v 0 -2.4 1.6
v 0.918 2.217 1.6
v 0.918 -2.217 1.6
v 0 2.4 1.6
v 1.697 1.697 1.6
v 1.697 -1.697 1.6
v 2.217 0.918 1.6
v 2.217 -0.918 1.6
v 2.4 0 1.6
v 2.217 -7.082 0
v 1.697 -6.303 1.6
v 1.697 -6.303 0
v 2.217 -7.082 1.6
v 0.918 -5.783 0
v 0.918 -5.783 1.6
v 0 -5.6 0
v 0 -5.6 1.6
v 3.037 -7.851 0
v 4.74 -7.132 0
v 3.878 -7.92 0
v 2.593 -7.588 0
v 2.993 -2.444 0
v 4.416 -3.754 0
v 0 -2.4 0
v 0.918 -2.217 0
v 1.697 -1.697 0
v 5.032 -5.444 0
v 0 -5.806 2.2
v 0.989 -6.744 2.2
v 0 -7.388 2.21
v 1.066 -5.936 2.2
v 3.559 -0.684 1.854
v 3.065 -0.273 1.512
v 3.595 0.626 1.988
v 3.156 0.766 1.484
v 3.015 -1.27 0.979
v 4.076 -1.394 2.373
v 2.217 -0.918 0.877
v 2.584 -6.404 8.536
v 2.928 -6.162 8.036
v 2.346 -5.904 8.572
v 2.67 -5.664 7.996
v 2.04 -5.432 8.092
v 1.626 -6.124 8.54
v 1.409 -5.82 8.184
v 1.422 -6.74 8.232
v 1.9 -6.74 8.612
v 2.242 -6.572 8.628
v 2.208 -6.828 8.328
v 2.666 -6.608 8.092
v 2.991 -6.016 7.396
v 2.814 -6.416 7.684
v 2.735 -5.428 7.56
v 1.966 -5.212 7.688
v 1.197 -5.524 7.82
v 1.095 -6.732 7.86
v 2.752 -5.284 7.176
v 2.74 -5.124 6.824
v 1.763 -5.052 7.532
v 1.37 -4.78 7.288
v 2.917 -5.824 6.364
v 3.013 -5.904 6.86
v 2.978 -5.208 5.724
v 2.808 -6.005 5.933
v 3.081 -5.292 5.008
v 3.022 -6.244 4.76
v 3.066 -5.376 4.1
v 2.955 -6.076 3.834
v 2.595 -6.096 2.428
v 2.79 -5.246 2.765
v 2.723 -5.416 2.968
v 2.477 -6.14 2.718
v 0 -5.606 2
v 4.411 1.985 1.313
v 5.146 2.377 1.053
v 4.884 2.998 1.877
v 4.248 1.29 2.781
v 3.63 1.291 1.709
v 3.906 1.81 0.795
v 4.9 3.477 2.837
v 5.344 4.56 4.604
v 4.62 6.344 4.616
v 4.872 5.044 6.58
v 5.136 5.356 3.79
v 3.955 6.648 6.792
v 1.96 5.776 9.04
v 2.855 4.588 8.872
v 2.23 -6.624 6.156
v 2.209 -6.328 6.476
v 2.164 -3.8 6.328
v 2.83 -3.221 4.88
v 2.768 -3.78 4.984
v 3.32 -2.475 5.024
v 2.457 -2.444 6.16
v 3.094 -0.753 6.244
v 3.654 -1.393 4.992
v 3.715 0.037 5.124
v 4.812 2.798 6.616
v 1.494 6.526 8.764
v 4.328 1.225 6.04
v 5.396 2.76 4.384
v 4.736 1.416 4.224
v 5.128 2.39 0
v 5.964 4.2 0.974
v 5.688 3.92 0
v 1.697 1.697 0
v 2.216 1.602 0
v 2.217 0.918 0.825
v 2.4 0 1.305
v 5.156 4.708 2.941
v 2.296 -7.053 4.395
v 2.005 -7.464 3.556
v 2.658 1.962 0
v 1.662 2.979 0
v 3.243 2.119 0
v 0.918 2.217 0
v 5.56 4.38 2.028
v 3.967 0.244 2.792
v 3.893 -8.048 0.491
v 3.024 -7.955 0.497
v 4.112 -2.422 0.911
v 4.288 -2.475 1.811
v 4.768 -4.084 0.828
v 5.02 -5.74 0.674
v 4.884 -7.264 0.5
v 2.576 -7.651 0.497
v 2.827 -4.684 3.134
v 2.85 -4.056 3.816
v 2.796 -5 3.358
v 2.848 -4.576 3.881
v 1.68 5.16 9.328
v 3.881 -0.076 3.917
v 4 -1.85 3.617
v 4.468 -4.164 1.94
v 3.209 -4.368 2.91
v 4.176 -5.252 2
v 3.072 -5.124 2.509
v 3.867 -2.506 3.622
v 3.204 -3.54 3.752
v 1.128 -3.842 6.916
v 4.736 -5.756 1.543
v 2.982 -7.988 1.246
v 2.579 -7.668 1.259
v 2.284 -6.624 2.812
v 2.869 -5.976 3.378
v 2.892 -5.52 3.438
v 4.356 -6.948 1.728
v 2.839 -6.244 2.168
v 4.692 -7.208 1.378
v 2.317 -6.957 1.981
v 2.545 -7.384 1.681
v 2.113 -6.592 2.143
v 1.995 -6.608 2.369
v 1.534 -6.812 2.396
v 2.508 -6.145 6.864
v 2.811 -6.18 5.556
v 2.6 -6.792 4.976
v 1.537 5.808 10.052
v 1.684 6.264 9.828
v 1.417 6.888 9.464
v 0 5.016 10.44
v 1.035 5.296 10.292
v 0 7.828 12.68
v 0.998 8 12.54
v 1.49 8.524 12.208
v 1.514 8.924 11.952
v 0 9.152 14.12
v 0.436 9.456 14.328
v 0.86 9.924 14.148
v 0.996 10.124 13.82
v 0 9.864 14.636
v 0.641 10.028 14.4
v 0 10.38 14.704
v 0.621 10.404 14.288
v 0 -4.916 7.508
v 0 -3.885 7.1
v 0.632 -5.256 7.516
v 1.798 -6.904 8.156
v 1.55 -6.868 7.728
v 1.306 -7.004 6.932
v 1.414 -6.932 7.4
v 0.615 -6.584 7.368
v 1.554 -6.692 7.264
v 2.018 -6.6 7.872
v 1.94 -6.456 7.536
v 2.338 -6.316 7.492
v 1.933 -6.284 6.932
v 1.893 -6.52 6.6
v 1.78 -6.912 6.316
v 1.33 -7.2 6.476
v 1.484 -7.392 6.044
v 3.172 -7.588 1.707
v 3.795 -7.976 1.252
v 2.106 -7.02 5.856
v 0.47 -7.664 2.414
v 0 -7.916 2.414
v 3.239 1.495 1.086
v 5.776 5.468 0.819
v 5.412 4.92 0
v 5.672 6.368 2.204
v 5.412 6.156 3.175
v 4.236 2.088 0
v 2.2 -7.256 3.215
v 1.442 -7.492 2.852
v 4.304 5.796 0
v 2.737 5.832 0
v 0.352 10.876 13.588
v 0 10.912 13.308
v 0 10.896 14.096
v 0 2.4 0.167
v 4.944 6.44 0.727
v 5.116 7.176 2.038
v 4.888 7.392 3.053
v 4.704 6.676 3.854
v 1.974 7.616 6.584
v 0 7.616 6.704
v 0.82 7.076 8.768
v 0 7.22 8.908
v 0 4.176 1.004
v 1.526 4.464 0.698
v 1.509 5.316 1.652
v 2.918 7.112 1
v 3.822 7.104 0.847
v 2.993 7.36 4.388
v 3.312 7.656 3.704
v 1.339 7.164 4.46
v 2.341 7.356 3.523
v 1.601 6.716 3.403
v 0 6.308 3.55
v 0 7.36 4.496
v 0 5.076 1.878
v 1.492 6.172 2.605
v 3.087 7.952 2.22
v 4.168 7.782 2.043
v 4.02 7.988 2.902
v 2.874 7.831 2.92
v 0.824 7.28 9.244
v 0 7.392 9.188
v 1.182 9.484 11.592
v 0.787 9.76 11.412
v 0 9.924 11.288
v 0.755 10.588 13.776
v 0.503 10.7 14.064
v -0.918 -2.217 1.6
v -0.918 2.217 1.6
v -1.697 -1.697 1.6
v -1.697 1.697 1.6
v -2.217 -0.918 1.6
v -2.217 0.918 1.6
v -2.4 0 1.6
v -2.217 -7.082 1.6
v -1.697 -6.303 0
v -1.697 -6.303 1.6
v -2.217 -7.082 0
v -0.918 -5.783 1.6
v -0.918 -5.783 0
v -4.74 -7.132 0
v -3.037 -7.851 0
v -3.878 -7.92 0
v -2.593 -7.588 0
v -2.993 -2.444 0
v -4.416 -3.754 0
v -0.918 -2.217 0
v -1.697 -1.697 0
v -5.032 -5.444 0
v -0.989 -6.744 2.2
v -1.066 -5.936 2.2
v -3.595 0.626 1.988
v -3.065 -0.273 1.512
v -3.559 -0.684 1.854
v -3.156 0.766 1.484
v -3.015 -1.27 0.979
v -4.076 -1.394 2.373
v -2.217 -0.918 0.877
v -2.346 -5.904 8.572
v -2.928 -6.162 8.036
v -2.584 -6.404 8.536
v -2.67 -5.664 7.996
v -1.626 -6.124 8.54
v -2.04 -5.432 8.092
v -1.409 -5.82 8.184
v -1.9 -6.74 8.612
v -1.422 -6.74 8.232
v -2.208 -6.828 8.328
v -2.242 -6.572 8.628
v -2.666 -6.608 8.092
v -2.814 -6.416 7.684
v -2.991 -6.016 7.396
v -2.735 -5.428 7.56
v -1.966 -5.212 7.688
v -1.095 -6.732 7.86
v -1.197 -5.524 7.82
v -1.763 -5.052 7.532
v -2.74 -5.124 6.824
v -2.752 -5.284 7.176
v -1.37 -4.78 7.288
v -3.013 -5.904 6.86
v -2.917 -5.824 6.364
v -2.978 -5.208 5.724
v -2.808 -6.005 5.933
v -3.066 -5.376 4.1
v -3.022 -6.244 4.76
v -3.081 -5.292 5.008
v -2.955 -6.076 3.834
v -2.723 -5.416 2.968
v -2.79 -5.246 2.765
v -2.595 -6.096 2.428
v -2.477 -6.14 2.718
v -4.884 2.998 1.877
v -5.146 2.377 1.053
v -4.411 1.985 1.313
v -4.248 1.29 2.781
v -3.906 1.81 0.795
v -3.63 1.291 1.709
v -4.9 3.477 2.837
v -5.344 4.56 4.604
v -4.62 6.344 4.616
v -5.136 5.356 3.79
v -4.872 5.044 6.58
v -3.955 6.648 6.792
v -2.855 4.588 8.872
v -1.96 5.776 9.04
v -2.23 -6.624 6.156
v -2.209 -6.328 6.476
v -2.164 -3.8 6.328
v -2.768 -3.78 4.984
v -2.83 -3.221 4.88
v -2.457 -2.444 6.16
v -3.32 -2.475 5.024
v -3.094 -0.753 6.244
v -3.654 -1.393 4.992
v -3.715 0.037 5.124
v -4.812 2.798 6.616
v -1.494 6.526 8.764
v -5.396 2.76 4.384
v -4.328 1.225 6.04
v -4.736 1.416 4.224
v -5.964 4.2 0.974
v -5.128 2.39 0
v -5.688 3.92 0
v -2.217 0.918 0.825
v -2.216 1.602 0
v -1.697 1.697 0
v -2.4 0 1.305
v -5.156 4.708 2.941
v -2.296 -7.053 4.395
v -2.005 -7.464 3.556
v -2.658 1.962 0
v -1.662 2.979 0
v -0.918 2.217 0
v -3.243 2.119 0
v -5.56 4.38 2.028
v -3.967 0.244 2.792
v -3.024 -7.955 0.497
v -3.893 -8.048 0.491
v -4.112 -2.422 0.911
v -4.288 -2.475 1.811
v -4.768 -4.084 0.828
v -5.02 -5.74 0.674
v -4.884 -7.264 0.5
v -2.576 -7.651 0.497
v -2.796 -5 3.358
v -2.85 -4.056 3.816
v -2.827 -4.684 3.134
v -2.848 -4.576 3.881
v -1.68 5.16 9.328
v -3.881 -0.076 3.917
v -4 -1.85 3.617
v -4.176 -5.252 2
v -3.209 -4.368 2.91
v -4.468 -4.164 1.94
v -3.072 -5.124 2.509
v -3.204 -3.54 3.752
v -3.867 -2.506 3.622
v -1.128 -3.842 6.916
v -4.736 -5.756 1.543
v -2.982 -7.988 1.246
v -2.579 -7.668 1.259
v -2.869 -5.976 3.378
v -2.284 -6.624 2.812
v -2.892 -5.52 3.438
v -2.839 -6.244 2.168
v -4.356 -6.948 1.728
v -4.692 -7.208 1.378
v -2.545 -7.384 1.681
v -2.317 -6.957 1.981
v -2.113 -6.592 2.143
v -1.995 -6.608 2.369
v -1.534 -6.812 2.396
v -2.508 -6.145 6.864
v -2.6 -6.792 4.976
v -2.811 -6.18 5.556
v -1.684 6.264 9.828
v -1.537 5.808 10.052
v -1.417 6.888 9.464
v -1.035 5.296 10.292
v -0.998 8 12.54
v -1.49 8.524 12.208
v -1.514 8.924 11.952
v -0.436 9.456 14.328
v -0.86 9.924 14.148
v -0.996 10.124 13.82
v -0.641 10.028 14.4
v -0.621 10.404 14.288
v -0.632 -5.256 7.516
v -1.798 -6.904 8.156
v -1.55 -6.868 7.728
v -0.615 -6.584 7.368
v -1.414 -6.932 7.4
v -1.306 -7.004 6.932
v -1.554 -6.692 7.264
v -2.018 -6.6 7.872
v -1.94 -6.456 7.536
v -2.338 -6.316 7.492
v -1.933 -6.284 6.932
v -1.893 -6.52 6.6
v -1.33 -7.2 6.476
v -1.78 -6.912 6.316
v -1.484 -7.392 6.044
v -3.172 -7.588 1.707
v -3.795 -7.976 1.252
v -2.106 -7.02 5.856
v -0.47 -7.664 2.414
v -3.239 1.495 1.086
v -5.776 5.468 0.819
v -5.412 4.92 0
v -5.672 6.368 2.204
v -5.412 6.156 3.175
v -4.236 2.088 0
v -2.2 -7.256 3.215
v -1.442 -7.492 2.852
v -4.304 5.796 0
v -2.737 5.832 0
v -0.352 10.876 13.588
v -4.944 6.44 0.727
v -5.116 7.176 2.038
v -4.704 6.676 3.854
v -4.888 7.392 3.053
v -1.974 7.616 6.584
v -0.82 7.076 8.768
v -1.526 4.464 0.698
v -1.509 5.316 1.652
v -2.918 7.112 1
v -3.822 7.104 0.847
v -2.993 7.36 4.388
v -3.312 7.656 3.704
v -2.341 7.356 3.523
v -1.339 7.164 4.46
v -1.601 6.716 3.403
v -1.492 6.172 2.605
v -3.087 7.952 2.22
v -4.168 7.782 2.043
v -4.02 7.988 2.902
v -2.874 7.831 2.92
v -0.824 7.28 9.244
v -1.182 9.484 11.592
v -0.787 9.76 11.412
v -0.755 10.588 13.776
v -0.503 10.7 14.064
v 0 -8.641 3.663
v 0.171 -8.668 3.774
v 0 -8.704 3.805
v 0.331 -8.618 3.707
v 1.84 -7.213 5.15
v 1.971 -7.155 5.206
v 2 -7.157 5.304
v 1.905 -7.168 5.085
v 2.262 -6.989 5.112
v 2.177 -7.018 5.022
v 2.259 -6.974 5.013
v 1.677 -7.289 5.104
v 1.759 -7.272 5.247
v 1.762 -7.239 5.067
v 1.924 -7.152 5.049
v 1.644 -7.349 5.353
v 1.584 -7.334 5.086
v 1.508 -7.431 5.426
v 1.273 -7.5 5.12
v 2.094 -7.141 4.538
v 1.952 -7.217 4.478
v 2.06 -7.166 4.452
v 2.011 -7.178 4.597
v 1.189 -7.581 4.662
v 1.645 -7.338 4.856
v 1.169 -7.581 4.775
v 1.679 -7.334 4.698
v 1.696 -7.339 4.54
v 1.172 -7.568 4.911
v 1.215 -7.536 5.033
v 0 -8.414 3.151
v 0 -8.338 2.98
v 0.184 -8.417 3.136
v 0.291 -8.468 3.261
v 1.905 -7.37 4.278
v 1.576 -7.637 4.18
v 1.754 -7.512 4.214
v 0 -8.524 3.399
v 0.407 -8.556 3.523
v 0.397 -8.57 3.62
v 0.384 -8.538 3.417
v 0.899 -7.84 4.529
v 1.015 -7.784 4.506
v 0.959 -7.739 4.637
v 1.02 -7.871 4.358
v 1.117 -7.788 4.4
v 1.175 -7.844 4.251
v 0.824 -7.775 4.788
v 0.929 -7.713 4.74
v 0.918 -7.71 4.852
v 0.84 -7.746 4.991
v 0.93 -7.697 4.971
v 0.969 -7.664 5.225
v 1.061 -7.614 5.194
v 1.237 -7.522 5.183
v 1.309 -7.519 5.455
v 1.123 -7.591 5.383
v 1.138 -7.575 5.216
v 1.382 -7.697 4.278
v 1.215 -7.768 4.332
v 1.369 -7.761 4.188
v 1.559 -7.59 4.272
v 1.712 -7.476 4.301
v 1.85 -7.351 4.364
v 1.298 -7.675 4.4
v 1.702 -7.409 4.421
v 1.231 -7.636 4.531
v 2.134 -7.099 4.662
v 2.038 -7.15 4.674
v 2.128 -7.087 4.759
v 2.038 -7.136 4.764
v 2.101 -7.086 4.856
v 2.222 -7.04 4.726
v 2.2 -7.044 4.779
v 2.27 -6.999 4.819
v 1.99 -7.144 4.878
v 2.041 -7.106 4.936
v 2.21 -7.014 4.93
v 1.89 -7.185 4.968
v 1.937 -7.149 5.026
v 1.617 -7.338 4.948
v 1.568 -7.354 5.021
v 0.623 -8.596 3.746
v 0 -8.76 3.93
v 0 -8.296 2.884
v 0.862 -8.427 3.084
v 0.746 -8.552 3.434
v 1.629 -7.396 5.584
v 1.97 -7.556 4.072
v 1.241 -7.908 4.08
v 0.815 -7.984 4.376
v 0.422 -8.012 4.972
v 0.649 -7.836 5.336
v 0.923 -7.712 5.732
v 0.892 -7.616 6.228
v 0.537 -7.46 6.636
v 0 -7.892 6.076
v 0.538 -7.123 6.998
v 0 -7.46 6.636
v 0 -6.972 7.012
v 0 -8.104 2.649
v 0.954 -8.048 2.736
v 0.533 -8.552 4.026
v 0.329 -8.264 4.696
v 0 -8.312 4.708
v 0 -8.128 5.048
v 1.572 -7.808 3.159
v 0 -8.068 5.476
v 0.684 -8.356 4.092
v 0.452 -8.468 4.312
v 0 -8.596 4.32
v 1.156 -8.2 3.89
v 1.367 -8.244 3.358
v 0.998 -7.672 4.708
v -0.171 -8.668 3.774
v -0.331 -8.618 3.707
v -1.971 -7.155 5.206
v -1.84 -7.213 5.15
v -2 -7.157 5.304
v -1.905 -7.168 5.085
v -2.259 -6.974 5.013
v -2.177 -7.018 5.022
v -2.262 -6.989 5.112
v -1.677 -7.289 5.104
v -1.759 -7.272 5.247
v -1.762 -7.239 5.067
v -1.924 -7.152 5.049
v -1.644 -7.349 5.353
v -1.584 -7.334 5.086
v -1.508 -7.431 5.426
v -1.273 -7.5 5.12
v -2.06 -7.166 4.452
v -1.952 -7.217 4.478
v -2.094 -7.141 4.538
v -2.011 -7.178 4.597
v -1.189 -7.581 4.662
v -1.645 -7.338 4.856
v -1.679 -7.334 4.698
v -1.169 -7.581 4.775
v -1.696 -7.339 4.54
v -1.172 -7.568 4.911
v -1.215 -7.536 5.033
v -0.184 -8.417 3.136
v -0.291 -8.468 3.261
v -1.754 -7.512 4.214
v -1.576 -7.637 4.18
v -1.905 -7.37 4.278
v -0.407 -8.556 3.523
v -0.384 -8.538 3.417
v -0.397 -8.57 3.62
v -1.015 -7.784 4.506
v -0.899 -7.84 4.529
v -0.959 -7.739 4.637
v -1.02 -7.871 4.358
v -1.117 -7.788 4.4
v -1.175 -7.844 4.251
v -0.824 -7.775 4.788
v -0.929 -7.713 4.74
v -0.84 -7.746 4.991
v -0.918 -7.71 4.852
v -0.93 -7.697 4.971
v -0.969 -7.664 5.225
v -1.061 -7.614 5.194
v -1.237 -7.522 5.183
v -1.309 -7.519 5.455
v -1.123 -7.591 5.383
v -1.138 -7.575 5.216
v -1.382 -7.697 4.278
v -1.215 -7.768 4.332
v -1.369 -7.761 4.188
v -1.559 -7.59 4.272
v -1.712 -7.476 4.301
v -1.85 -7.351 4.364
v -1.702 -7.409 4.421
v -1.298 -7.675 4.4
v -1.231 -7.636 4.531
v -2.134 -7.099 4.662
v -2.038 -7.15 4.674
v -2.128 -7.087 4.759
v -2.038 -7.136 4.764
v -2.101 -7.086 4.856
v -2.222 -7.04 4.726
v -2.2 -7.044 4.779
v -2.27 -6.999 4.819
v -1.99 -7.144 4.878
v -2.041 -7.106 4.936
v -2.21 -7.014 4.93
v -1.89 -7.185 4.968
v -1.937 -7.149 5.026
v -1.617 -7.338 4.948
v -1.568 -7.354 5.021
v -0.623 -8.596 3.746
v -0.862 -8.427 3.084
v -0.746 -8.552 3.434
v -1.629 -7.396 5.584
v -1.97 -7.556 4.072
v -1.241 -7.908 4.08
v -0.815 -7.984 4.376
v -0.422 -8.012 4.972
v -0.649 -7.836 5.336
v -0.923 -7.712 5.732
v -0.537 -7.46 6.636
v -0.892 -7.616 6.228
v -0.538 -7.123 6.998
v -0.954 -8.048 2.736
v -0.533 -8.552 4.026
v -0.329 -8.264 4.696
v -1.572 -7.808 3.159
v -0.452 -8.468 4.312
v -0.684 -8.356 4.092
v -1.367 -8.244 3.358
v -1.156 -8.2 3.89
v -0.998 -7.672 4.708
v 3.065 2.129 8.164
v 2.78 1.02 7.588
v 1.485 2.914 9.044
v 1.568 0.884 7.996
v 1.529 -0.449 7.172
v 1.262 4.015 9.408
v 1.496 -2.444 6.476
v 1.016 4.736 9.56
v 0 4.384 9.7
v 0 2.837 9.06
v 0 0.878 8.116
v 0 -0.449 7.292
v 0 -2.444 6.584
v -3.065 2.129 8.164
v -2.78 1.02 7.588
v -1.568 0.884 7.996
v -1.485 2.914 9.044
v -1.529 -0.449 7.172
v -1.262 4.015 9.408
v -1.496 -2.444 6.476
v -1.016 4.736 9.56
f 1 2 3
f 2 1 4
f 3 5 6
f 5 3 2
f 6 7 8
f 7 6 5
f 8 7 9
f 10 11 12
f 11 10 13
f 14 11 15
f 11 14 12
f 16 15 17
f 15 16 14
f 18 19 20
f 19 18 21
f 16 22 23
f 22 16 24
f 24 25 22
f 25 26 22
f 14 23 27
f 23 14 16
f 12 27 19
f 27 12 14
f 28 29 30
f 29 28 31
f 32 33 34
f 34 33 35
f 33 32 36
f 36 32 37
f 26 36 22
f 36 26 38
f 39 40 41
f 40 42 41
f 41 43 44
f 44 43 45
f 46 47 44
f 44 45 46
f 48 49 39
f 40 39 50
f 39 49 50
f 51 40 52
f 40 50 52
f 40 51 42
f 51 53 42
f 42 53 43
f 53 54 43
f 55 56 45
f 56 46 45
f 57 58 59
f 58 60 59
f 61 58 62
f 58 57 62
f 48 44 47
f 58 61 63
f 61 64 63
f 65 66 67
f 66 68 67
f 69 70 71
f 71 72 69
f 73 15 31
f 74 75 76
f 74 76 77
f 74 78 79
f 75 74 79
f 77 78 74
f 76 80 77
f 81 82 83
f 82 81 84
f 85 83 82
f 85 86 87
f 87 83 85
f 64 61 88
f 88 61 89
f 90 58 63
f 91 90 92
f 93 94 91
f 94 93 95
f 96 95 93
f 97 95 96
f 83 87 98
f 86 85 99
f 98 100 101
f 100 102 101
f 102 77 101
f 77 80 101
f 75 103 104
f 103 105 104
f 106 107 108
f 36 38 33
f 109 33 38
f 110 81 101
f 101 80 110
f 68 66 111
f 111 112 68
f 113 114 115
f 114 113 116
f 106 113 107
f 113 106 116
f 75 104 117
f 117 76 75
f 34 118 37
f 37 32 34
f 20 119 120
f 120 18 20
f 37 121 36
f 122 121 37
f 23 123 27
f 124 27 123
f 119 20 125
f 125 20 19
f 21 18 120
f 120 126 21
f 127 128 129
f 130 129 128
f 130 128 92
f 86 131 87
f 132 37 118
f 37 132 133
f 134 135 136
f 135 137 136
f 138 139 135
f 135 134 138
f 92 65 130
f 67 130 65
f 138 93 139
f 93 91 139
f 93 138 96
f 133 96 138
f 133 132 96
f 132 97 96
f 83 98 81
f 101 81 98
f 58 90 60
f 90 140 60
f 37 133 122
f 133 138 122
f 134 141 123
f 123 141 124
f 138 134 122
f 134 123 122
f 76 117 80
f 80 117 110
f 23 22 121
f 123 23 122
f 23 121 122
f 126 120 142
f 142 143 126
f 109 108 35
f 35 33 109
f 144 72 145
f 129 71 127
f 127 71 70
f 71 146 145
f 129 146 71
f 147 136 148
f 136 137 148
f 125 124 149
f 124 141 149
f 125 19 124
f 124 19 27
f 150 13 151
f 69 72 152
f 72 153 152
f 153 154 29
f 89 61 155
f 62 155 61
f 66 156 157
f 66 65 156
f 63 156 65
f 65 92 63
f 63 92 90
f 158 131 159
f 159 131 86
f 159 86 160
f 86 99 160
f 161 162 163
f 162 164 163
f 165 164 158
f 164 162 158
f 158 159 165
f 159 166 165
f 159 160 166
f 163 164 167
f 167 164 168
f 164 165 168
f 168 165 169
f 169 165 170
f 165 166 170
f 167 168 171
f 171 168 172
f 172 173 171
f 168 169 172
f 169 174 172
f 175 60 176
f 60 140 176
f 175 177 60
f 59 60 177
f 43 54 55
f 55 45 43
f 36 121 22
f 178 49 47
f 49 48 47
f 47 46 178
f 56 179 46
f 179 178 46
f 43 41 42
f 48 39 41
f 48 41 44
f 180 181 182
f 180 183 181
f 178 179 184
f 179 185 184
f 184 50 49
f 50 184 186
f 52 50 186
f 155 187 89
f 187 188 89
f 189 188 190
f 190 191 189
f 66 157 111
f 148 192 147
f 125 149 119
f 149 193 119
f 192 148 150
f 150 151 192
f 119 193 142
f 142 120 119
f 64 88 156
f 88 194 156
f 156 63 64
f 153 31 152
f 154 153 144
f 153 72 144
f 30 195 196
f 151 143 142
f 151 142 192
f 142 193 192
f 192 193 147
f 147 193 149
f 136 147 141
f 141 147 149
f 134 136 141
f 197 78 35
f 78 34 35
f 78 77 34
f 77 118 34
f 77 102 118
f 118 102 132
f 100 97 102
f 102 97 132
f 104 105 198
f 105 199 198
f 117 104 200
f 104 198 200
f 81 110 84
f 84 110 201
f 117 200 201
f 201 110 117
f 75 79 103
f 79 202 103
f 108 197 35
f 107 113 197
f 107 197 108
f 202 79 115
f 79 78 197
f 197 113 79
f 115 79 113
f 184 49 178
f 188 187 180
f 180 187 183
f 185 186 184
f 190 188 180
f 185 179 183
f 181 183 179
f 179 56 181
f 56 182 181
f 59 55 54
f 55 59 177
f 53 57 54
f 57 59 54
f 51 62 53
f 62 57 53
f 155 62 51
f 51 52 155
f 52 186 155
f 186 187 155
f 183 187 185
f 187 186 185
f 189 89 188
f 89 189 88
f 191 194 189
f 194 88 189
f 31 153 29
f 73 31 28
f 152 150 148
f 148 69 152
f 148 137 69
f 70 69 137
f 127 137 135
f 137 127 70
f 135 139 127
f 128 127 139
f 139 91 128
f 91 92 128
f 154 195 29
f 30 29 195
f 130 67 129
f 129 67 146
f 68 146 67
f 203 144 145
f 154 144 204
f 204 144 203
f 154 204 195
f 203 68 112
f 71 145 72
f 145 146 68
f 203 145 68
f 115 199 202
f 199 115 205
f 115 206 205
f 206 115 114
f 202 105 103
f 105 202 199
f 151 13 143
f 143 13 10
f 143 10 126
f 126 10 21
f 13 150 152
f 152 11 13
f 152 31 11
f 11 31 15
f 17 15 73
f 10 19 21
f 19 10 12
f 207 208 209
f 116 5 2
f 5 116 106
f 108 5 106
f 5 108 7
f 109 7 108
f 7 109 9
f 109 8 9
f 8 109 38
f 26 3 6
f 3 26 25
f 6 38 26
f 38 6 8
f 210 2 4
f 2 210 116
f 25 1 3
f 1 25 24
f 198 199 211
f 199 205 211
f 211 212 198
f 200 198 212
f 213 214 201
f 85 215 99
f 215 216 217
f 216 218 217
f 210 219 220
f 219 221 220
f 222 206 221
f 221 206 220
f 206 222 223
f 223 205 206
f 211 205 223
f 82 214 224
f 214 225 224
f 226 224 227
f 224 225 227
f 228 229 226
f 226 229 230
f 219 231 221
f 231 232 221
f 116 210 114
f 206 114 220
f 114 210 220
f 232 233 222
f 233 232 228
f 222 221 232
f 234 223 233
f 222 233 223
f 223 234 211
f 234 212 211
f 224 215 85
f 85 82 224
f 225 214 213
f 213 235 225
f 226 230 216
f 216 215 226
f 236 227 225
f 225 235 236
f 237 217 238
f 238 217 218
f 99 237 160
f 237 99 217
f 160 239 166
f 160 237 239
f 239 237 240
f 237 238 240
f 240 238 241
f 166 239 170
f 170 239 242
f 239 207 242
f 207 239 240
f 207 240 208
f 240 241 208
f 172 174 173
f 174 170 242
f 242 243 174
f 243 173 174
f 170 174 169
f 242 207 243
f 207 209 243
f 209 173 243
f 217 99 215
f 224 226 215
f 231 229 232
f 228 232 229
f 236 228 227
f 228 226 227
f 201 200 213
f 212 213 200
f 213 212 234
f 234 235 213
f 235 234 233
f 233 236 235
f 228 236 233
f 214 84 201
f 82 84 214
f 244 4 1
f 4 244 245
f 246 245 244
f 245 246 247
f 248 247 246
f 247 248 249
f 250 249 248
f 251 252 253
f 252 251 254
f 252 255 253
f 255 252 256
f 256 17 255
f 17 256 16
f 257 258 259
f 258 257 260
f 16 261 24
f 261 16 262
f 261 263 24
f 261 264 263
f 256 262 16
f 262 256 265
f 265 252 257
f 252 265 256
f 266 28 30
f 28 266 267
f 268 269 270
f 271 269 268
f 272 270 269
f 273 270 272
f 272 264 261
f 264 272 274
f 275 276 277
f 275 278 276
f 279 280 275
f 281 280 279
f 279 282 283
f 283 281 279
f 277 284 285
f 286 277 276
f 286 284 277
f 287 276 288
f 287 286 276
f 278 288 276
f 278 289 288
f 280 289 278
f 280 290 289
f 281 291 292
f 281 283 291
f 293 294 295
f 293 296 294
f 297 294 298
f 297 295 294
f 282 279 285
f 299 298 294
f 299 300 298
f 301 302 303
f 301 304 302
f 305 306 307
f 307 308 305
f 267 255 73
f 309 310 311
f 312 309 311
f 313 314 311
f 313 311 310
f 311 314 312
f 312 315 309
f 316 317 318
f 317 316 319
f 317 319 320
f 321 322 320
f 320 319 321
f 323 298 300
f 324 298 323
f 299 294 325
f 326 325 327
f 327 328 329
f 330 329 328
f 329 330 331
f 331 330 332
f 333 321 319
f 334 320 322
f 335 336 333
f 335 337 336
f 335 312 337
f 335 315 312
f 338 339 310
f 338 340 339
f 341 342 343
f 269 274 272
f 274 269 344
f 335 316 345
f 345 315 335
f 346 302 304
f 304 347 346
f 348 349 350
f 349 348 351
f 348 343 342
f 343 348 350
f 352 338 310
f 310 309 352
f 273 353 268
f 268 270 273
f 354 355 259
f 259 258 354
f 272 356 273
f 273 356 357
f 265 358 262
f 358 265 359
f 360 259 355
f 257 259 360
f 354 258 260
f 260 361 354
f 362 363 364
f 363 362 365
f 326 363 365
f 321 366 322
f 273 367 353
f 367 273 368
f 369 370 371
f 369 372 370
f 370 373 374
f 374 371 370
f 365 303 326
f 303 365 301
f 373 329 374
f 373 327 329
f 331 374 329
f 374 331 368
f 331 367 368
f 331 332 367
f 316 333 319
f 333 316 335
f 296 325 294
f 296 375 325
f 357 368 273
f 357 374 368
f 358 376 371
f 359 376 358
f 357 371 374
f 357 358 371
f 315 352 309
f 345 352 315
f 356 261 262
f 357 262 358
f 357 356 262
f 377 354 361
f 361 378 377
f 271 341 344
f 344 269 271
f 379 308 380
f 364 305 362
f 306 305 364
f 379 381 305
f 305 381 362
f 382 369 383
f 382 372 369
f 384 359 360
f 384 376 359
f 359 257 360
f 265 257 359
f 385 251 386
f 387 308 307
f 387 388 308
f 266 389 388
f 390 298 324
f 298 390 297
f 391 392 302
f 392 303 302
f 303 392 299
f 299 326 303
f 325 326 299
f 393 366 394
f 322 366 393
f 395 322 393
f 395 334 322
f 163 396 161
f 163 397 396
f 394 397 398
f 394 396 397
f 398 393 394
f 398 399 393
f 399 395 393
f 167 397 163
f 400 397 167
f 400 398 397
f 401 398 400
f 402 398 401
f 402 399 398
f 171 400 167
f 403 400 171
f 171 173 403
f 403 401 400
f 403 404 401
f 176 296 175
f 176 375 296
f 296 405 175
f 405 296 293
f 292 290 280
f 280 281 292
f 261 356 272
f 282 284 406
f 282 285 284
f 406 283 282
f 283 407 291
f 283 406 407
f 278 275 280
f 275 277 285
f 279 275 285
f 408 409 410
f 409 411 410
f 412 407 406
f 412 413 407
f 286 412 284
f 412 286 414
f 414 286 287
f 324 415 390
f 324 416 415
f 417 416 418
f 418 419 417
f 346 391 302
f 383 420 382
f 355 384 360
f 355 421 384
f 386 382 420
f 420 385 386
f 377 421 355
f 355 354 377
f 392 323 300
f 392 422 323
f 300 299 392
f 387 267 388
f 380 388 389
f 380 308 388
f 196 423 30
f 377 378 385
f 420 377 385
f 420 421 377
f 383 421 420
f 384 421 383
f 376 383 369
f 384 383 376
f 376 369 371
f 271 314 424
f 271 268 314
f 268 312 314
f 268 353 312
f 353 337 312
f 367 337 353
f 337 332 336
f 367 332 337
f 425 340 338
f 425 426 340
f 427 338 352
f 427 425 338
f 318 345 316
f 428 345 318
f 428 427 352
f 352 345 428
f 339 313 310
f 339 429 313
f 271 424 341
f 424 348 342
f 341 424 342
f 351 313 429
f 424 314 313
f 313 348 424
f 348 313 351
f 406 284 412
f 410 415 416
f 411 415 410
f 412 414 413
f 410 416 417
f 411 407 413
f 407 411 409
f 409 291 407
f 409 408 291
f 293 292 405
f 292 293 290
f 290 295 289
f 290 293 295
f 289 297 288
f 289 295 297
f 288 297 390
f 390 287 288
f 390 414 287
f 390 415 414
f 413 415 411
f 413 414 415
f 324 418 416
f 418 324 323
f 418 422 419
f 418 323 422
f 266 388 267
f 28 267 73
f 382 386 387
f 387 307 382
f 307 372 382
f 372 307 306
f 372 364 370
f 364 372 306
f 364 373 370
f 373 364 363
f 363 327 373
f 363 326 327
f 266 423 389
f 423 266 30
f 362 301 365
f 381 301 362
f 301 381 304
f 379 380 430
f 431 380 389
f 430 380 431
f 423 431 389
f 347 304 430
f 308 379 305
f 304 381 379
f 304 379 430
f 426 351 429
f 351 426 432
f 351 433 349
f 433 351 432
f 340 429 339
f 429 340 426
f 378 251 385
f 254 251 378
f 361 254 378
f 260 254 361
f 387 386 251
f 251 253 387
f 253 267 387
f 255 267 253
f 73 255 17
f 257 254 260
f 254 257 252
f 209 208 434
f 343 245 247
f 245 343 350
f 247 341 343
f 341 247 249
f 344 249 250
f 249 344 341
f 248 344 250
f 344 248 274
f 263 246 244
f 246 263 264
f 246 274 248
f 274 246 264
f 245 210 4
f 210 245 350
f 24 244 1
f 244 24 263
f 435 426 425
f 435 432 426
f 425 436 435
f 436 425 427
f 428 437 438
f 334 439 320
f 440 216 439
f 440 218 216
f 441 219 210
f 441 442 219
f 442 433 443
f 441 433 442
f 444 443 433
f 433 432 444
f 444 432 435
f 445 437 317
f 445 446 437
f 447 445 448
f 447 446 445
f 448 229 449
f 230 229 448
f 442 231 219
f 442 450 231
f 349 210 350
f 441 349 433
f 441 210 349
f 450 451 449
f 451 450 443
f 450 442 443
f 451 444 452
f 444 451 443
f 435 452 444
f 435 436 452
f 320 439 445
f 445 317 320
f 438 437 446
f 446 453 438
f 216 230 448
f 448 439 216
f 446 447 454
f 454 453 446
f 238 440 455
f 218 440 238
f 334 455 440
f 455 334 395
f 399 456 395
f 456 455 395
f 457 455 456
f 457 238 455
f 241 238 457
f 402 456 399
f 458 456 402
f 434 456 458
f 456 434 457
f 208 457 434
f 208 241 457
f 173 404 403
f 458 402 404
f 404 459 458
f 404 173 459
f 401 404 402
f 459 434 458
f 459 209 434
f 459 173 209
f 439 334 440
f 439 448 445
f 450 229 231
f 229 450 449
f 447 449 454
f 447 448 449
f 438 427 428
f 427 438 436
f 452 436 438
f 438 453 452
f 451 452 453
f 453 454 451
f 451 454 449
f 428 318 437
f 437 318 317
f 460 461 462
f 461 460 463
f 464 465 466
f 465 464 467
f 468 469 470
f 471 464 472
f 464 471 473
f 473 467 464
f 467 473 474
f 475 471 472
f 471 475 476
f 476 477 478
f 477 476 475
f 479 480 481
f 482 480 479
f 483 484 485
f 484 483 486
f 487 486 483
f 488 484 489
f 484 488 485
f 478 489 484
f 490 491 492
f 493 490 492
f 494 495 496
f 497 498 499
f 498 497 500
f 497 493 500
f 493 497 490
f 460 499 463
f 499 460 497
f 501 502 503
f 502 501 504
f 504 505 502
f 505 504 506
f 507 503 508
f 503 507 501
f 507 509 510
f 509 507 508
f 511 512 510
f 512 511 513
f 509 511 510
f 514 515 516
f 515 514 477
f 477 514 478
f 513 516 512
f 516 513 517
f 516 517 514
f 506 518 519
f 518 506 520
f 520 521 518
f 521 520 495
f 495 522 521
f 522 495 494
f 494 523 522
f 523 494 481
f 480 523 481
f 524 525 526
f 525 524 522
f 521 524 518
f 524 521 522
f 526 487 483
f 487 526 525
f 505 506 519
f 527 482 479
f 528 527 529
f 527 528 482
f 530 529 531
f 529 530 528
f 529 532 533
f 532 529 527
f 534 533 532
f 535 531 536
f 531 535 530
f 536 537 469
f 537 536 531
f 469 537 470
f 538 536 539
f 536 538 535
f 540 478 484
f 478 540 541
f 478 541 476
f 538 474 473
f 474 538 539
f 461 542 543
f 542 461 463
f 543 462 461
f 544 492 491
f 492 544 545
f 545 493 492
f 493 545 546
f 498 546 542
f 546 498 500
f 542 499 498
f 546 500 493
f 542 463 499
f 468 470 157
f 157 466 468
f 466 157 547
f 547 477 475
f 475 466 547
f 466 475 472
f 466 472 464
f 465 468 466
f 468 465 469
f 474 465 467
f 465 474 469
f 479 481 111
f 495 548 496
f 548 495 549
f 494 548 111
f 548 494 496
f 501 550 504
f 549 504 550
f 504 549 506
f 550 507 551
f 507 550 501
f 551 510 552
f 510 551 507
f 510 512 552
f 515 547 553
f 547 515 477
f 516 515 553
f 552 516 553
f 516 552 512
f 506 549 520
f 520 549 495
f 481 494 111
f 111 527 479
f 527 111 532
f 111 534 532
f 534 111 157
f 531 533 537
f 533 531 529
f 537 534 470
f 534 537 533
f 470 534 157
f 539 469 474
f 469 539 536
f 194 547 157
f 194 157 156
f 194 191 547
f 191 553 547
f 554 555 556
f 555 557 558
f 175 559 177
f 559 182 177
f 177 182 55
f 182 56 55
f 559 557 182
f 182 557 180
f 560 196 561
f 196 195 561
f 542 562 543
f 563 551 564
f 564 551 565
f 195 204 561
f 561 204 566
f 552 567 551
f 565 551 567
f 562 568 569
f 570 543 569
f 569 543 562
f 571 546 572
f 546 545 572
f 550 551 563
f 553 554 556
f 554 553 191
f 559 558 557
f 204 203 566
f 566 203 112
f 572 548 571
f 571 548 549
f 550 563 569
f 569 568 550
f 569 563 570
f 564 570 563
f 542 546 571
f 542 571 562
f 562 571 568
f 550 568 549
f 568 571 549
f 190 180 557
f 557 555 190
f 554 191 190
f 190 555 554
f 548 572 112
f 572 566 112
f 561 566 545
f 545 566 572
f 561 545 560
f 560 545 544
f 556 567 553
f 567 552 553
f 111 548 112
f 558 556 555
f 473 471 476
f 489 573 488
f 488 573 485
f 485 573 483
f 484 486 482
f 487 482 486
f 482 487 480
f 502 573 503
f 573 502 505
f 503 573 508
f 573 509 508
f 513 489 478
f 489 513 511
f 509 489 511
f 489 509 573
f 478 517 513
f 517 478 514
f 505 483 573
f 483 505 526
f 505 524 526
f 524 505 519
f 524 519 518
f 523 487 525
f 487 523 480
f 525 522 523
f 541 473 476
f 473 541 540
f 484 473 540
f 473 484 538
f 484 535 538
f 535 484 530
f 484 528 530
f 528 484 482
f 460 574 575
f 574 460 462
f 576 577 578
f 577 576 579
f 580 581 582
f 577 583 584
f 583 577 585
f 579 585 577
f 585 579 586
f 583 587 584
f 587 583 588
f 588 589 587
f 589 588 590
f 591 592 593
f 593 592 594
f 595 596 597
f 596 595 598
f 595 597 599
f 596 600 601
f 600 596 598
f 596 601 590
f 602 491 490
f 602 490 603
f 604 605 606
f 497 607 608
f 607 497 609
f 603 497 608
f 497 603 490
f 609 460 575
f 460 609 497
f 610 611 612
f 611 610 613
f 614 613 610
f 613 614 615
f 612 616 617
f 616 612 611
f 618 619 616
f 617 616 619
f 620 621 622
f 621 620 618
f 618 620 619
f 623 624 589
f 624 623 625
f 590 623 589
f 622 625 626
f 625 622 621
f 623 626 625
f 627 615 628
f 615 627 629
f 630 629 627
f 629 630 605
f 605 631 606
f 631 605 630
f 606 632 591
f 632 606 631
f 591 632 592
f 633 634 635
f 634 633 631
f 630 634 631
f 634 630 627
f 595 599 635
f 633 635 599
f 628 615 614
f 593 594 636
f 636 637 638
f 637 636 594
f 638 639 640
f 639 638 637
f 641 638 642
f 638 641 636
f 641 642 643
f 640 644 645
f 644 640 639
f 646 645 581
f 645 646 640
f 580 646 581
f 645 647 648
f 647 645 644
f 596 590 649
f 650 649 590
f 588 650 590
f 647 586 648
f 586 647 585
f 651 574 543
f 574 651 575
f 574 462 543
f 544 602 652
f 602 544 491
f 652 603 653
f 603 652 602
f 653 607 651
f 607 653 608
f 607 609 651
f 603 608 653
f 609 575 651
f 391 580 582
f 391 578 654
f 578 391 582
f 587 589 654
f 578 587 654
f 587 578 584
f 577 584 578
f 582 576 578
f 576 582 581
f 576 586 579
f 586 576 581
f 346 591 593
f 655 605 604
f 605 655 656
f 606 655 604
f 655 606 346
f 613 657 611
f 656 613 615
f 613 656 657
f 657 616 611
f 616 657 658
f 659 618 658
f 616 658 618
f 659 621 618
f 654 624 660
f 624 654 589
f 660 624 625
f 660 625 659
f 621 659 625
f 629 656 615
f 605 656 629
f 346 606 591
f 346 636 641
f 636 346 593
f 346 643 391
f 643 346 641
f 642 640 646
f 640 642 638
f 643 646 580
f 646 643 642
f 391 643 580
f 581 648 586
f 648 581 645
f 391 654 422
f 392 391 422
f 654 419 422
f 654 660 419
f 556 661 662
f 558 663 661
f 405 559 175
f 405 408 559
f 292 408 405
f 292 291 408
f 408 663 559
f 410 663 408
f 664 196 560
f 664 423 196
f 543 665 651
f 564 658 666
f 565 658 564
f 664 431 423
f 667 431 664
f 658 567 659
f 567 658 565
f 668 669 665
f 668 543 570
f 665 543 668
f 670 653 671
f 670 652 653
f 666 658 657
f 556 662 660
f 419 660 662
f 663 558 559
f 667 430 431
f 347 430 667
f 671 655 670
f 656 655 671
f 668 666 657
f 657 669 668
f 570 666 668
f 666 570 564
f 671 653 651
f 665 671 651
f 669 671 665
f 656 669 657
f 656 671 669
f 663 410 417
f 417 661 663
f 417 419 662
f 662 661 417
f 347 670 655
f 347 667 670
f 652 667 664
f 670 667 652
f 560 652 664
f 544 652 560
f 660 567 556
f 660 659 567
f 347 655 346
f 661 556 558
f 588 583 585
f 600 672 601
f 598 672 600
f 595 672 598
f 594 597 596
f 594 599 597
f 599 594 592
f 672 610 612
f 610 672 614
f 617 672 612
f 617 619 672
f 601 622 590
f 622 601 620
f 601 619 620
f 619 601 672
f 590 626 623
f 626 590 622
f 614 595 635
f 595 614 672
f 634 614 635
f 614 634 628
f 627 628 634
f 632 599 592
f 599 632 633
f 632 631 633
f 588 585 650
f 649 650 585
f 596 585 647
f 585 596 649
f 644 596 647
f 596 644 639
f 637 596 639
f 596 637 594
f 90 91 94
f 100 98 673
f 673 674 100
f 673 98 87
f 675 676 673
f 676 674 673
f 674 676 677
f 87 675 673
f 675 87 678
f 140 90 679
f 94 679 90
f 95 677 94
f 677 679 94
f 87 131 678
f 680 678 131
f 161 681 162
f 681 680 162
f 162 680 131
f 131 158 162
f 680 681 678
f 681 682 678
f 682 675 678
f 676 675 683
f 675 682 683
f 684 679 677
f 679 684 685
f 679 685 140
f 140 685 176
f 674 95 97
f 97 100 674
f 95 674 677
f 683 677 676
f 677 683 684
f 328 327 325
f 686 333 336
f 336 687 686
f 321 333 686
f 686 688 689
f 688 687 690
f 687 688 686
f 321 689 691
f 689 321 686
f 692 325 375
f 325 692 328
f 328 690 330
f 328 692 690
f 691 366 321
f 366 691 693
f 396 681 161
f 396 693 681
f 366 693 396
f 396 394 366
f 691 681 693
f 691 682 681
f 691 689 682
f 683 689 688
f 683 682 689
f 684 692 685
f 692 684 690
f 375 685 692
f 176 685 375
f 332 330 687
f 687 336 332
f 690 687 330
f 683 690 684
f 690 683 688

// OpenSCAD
use <../lib.scad>
use <s/6251p07s01.scad>
use <s/6251s01.scad>
use <s/6251s03.scad>
function ldraw_lib__6251p07() = [
// 0 Animal Cat Crouching with Black Pupils, Eyelashes and Nose Pattern
// 0 Name: 6251p07.dat
// 0 Author: Willy Tschager [Holly-Wood]
// 0 !LDRAW_ORG Part UPDATE 2022-06
// 0 !LICENSE Licensed under CC BY 2.0 and CC BY 4.0 : see CAreadme.txt
// 
// 0 BFC CERTIFY CW
  [0,"BFC","CERTIFY"],
  [0,"BFC","CW"],
// 
// 0 !KEYWORDS Belville, creature, mousetrap, pet, set 10173, set 10185, set 7600
// 
// 0 !HISTORY 2022-12-20 [PTadmin] Official Update 2022-06
// 
// 
// 0 // Half without Patternable Area
// 
// 1 16 0 0 0 1 0 0 0 1 0 0 0 1 s\6251s01.dat
  [1,16,0,0,0,1,0,0,0,1,0,0,0,1, ldraw_lib__s__6251s01()],
// 1 16 0 0 0 -1 0 0 0 1 0 0 0 1 s\6251s01.dat
  [1,16,0,0,0,-1,0,0,0,1,0,0,0,1, ldraw_lib__s__6251s01()],
// 
// 0 // Patternable Area
// 1 16 0 0 0 1 0 0 0 1 0 0 0 1 s\6251p07s01.dat
  [1,16,0,0,0,1,0,0,0,1,0,0,0,1, ldraw_lib__s__6251p07s01()],
// 1 16 0 0 0 -1 0 0 0 1 0 0 0 1 s\6251p07s01.dat
  [1,16,0,0,0,-1,0,0,0,1,0,0,0,1, ldraw_lib__s__6251p07s01()],
// 
// 0 // Patternable Area Back
// 1 16 0 0 0 1 0 0 0 1 0 0 0 1 s\6251s03.dat
  [1,16,0,0,0,1,0,0,0,1,0,0,0,1, ldraw_lib__s__6251s03()],
// 1 16 0 0 0 -1 0 0 0 1 0 0 0 1 s\6251s03.dat
  [1,16,0,0,0,-1,0,0,0,1,0,0,0,1, ldraw_lib__s__6251s03()],
];
module ldraw_lib__6251p07(step=0, col=false, unit=2/5, alt=false, line=0.2, solid=!$preview)
    makepoly(ldraw_lib__6251p07(), step=step, col=col, unit=unit, alt=alt, line=line, solid=solid);
ldraw_lib__6251p07(line=0.2);
